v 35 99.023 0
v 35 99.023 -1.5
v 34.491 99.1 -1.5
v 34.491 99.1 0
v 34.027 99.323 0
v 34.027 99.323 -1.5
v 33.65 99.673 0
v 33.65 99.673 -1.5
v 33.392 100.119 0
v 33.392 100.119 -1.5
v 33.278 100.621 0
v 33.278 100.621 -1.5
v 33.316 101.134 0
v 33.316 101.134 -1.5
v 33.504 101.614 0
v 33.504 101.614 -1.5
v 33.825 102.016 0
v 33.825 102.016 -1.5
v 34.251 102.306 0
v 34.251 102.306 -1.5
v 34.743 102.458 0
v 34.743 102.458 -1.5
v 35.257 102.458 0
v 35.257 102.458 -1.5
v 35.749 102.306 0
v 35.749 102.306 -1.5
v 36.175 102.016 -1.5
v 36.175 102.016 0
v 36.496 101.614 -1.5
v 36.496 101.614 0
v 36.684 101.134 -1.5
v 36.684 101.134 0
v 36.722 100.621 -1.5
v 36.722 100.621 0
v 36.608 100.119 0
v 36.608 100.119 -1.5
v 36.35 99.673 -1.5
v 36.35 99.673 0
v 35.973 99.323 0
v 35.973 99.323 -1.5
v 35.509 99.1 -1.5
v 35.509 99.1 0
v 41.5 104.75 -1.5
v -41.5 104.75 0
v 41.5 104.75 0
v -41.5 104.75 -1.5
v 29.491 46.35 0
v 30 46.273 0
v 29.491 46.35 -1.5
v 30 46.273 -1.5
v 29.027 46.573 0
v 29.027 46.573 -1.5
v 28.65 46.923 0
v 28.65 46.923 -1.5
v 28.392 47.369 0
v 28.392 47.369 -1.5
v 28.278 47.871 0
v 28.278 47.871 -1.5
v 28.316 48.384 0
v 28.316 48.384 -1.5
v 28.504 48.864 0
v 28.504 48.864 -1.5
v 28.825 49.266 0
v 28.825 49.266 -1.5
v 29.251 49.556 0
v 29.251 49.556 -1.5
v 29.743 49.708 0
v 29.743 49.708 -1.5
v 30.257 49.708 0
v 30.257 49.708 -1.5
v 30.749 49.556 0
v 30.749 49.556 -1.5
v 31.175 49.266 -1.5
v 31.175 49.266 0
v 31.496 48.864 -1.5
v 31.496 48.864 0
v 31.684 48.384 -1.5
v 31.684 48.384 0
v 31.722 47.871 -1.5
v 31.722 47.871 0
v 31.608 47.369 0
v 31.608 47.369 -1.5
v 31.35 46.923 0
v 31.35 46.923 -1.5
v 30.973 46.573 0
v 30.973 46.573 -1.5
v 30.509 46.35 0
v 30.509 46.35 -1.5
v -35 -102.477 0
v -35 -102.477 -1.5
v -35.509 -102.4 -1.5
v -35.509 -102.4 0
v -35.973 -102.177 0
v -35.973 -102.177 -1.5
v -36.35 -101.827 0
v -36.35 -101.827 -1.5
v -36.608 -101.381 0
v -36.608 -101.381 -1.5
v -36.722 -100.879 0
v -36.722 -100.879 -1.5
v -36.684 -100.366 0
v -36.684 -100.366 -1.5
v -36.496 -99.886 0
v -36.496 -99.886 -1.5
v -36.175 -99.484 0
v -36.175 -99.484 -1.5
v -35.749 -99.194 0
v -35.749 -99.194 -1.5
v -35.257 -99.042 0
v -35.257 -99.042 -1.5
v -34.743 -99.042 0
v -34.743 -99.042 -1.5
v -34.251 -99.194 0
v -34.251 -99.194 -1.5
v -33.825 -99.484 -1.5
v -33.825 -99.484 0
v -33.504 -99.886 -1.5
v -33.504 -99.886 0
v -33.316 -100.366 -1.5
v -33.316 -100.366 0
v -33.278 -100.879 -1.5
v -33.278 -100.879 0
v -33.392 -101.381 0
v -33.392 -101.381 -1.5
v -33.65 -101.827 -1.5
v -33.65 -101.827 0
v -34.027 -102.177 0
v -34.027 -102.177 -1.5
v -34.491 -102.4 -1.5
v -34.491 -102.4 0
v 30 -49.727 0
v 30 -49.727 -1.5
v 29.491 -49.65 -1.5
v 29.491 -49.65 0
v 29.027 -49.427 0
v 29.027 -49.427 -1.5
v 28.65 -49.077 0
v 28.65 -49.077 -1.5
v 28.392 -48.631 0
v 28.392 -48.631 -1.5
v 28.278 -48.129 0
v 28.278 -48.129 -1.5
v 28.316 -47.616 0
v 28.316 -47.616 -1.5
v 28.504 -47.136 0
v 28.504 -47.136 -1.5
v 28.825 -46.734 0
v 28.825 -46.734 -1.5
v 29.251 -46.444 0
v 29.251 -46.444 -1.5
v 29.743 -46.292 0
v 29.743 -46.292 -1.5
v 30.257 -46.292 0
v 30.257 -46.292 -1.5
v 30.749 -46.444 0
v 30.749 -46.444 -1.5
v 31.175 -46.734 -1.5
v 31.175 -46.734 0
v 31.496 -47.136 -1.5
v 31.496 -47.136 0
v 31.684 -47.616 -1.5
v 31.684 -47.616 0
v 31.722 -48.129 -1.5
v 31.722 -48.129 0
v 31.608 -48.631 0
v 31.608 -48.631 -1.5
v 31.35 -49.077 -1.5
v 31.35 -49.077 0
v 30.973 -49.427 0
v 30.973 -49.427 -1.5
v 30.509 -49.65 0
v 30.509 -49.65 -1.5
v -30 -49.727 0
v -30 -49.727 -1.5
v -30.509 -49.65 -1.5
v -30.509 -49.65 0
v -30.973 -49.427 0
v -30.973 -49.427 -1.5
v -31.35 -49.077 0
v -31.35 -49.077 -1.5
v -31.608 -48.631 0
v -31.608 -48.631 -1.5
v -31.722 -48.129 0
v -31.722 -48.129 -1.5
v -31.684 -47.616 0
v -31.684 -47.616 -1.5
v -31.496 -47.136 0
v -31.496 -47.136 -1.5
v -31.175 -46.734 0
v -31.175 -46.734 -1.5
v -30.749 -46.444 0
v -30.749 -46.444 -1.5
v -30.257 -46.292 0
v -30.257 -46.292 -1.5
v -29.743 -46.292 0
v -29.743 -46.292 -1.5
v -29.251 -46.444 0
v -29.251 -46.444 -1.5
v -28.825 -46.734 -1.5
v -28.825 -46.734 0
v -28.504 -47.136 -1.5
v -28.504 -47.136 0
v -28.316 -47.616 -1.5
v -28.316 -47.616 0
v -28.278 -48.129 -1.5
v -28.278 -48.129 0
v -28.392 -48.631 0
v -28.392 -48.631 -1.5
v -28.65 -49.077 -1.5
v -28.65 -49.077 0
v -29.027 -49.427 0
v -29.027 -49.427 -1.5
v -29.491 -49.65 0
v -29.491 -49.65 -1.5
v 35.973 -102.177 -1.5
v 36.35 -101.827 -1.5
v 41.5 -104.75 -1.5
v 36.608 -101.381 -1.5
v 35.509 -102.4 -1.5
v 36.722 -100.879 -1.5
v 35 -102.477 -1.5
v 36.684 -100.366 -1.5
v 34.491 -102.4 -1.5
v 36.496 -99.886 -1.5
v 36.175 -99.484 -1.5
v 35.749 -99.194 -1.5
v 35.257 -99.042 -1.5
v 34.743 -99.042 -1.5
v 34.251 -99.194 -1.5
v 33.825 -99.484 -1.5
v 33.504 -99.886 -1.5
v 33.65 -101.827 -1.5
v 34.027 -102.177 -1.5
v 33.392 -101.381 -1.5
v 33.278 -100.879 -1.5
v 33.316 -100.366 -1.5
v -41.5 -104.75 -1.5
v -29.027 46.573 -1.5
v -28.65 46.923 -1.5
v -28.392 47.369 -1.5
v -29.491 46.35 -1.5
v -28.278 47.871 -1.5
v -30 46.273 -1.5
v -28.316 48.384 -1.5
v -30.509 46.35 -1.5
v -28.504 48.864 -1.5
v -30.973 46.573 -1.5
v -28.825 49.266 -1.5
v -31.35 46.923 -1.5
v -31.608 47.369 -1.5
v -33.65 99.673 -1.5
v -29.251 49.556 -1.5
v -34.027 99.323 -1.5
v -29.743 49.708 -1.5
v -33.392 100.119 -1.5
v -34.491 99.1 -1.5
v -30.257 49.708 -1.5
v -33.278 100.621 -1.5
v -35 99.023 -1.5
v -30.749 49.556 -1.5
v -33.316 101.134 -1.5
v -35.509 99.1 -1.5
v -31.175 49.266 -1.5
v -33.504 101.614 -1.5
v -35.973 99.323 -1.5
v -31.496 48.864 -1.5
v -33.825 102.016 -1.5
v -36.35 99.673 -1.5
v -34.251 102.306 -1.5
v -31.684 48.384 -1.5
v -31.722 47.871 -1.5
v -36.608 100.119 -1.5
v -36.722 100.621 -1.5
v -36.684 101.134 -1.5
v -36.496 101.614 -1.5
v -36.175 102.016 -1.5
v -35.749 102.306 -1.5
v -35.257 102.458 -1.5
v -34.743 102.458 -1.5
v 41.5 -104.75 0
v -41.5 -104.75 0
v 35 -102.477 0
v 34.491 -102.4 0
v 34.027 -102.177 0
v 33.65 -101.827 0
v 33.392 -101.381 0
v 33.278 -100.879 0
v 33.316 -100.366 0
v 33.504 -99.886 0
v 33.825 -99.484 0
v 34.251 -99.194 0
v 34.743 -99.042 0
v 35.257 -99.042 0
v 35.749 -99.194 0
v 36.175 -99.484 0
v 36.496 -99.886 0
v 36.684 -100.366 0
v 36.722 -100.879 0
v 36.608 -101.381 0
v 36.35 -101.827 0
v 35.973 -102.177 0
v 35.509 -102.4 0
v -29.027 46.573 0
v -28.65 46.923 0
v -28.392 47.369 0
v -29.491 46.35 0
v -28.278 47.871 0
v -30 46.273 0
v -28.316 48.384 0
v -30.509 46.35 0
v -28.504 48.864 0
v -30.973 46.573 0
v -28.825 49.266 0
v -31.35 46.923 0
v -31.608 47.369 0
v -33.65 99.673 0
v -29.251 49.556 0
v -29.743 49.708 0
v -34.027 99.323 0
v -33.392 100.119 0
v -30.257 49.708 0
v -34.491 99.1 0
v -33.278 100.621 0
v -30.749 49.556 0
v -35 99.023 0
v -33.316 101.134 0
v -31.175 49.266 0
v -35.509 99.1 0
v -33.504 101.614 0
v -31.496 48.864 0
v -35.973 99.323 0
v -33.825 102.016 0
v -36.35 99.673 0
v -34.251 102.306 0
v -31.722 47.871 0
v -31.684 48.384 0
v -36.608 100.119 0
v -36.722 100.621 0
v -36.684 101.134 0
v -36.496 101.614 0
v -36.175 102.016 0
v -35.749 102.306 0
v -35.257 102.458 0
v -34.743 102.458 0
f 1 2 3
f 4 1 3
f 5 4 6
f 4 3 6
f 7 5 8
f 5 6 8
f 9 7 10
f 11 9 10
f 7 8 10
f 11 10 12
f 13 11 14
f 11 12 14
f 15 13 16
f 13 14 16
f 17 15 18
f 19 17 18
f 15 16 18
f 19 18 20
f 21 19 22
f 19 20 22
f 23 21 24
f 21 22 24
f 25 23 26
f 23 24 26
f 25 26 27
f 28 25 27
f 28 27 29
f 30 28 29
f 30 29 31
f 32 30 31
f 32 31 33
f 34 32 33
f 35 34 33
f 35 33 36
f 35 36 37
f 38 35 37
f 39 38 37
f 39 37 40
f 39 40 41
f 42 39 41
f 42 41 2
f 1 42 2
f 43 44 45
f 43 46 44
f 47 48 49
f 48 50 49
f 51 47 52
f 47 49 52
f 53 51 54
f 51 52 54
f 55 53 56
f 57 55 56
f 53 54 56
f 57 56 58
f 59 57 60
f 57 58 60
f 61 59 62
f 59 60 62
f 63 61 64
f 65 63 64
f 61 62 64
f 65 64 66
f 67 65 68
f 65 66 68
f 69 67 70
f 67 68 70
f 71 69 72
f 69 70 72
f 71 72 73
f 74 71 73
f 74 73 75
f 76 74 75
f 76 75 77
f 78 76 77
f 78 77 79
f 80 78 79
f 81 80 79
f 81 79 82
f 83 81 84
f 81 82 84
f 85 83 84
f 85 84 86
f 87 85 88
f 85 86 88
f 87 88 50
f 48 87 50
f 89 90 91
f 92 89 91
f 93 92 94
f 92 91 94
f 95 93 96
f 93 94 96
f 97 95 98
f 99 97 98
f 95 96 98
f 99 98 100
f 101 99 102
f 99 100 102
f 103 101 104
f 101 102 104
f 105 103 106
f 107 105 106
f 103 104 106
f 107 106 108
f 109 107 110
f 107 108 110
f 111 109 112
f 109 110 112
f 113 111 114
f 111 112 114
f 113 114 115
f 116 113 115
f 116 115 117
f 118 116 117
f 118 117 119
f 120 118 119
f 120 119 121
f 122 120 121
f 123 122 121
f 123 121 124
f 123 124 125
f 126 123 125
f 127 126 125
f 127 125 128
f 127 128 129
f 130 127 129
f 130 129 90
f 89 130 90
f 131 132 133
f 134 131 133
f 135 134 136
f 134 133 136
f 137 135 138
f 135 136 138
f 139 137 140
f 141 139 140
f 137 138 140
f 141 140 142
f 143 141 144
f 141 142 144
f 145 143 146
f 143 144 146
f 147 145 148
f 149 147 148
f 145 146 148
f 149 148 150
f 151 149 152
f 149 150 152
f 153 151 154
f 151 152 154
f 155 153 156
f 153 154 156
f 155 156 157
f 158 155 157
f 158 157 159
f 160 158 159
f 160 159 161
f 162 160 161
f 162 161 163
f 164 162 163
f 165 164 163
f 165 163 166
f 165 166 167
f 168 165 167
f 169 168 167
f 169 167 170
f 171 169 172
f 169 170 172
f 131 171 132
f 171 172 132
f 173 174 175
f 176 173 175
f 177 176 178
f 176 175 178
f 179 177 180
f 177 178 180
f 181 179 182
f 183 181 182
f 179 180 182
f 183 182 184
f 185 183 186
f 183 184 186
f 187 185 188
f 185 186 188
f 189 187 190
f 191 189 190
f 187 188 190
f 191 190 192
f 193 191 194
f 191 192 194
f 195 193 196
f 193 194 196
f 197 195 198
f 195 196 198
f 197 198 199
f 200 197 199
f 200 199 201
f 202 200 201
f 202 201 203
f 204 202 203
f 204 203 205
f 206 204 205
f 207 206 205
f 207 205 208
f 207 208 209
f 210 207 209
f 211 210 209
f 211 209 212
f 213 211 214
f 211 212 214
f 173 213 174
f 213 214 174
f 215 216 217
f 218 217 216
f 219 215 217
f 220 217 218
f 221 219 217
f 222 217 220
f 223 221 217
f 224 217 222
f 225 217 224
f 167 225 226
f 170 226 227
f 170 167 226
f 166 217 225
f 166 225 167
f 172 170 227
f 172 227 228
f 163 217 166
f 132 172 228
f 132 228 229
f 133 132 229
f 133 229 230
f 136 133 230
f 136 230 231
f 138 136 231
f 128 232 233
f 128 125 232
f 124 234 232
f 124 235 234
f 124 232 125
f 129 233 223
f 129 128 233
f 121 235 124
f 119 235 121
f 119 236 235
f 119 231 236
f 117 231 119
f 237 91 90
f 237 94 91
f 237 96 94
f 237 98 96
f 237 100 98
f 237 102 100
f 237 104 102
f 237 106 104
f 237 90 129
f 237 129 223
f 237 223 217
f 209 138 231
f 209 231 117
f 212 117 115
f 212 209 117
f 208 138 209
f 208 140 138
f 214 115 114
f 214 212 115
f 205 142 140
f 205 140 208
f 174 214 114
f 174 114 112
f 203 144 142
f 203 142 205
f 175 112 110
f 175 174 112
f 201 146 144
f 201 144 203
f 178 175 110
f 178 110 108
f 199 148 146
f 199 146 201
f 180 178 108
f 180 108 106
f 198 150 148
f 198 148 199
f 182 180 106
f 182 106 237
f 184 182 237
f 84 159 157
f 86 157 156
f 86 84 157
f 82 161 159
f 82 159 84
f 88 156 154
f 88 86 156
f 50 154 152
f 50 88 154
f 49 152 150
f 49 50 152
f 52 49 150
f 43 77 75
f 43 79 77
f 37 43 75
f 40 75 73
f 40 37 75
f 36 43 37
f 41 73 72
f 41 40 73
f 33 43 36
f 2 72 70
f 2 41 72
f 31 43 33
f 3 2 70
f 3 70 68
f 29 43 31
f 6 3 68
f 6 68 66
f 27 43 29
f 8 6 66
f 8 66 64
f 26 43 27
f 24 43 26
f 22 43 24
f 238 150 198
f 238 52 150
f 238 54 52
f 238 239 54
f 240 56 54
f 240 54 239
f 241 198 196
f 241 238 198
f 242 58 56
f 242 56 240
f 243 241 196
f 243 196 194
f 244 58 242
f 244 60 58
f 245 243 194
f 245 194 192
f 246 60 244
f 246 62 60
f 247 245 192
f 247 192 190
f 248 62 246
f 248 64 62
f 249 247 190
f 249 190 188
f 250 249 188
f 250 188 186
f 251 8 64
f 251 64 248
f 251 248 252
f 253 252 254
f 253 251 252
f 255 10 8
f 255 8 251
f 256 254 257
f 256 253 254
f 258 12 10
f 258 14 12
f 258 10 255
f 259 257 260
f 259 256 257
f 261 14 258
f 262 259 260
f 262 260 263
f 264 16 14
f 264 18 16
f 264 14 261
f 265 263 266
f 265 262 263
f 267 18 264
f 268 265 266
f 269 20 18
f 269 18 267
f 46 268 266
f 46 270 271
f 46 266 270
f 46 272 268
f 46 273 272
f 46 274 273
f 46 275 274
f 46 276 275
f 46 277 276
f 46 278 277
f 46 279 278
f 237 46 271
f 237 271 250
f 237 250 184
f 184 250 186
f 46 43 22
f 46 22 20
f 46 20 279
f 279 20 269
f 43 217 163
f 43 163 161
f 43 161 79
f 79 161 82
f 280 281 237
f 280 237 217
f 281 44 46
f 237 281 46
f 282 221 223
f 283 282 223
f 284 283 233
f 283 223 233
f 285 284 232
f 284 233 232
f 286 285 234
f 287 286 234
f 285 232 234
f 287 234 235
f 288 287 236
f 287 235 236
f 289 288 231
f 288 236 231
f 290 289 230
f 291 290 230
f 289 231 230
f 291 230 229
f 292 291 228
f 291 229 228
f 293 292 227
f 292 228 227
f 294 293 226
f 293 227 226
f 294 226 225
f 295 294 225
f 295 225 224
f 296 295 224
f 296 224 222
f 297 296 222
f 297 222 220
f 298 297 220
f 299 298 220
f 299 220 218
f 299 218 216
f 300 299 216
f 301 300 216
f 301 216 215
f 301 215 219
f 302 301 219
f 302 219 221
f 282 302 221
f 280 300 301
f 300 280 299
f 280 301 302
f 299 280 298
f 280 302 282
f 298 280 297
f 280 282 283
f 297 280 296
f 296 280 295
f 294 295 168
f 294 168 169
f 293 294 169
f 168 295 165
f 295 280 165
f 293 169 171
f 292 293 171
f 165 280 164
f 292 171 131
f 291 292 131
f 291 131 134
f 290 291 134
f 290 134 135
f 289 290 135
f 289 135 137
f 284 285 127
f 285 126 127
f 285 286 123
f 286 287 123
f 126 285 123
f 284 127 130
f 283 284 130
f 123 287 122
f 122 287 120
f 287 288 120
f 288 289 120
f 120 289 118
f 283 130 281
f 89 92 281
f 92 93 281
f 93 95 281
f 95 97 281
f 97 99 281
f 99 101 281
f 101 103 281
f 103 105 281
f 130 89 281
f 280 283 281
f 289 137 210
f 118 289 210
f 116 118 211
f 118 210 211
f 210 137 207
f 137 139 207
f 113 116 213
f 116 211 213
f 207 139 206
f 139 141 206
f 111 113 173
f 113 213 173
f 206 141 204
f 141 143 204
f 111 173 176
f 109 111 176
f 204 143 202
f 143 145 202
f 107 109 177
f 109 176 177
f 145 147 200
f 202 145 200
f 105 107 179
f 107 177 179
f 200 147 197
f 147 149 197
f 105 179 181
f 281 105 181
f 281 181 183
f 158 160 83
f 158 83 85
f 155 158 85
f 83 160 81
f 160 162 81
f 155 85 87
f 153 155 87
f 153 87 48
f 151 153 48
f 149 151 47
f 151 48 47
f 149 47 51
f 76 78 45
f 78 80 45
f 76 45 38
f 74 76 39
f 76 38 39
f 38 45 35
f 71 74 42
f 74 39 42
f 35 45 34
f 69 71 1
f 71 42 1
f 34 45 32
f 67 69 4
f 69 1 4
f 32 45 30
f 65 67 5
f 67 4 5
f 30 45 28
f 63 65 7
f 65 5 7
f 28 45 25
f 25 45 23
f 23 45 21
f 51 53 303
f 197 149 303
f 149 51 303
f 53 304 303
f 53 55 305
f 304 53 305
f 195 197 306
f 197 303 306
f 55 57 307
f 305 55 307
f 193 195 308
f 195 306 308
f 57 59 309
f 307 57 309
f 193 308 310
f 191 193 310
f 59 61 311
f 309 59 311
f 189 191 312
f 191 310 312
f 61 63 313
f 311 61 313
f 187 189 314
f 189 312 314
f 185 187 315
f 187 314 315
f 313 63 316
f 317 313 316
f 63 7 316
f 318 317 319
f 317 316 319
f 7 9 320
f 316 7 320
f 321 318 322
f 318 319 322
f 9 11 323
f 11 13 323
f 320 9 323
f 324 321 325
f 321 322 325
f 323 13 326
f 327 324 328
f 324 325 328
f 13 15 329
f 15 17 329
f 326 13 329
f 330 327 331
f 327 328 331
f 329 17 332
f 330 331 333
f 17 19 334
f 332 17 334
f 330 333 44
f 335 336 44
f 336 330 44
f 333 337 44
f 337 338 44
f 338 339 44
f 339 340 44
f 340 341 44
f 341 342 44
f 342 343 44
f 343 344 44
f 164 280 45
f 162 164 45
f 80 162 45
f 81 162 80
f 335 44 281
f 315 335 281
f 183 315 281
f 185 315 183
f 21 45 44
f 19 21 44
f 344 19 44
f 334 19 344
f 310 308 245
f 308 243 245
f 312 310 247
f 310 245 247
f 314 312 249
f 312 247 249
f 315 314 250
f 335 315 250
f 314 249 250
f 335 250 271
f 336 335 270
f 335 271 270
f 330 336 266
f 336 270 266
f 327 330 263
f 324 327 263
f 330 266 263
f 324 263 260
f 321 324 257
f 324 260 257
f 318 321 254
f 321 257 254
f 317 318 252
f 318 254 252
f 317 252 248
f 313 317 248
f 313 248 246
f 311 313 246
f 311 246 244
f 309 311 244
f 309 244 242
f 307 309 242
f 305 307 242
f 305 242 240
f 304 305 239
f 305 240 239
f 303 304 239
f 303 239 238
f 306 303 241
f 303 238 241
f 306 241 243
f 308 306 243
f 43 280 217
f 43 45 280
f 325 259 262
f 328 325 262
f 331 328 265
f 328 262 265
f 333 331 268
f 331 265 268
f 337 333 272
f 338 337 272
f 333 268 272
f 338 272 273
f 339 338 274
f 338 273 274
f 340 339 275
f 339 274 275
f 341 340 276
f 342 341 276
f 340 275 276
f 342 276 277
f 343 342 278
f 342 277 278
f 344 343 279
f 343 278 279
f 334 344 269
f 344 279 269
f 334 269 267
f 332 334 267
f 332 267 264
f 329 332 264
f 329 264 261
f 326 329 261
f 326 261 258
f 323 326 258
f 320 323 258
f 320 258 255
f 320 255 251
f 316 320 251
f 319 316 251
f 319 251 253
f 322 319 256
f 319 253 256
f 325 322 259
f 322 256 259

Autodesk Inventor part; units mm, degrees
ref_plane "YZ Plane" through (0, 0, 0) normal (1, 0, 0) x (0, 1, 0)
ref_plane "XZ Plane" through (0, 0, 0) normal (0, 1, 0) x (-1, 0, 0)
ref_plane "XY Plane" through (0, 0, 0) normal (0, 0, 1) x (1, 0, 0)
sketch "Sketch1" plane through (0, 0, 0) normal (0, 0, 1) x (1, 0, 0)
  line L0 (-41.5, 48) -> (41.5, 48)
  line L1 (41.5, 48) -> (41.5, -48)
  line L2 (41.5, -48) -> (-41.5, -48)
  line L3 (-41.5, -48) -> (-41.5, 48)
  point P0 (0, 0)
  dimension "d0" = 83
  dimension "d1" = 96
  dimension "d2" = 48
  dimension "d3" = 41.5
extrude "Extrusion1" add sketch "Sketch1" against normal blind 1.5
sketch "Sketch7" plane through (-41.5, 48, 0) normal (0, 1, 0) x (1, 0, 0)
  line L0 (0, 0) -> (83, 0) projected
  line L1 (83, 0) -> (83, 1.5) projected
  line L2 (0, 1.5) -> (83, 1.5) projected
  line L3 (0, 0) -> (0, 1.5) projected
  point P0 (41.5, 0)
extrude "Extrusion5" add sketch "Sketch7" along normal blind 56.75
sketch "Sketch8" plane through (-41.5, -48, 0) normal (0, -1, 0) x (1, 0, 0)
  line L0 (83, 0) -> (0, 0) projected
  line L1 (0, 0) -> (0, -1.5) projected
  line L2 (83, -1.5) -> (0, -1.5) projected
  line L3 (83, 0) -> (83, -1.5) projected
  point P0 (41.5, 0)
extrude "Extrusion6" add sketch "Sketch8" along normal blind 56.75
sketch "Sketch9" plane through (0, 0, 0) normal (0, 0, 1) x (1, 0, 0)
  circle A0 centre (35, -100.75) radius 3 projected
  circle A1 centre (-35, -100.75) radius 3 projected
  circle A2 centre (-30, -48) radius 3 projected
  circle A3 centre (30, -48) radius 3 projected
  circle A4 centre (30, 48) radius 3 projected
  circle A5 centre (-30, 48) radius 3 projected
  circle A6 centre (35, 100.75) radius 3 projected
  circle A7 centre (-35, 100.75) radius 3 projected
  point P0 (0, 0)
hole "Hole3" at (35, -100.75, 0) at (-35, -100.75, 0) at (30, -48, 0) at (-30, -48, 0) at (30, 48, 0) at (-30, 48, 0) at (35, 100.75, 0) at (-35, 100.75, 0) direction (0, 0, -1) diameter 3.454 end through all clearance for "Flat Head Machine Screw (82)" size "#4" standard "Ansi Unified Screw Threads"
equation "\"d2\" = 0.5 * d1"
equation "\"d3\" = 0.5 * d0"
properties part number "memesat shear panel type 2" material "Aluminum 6061"
